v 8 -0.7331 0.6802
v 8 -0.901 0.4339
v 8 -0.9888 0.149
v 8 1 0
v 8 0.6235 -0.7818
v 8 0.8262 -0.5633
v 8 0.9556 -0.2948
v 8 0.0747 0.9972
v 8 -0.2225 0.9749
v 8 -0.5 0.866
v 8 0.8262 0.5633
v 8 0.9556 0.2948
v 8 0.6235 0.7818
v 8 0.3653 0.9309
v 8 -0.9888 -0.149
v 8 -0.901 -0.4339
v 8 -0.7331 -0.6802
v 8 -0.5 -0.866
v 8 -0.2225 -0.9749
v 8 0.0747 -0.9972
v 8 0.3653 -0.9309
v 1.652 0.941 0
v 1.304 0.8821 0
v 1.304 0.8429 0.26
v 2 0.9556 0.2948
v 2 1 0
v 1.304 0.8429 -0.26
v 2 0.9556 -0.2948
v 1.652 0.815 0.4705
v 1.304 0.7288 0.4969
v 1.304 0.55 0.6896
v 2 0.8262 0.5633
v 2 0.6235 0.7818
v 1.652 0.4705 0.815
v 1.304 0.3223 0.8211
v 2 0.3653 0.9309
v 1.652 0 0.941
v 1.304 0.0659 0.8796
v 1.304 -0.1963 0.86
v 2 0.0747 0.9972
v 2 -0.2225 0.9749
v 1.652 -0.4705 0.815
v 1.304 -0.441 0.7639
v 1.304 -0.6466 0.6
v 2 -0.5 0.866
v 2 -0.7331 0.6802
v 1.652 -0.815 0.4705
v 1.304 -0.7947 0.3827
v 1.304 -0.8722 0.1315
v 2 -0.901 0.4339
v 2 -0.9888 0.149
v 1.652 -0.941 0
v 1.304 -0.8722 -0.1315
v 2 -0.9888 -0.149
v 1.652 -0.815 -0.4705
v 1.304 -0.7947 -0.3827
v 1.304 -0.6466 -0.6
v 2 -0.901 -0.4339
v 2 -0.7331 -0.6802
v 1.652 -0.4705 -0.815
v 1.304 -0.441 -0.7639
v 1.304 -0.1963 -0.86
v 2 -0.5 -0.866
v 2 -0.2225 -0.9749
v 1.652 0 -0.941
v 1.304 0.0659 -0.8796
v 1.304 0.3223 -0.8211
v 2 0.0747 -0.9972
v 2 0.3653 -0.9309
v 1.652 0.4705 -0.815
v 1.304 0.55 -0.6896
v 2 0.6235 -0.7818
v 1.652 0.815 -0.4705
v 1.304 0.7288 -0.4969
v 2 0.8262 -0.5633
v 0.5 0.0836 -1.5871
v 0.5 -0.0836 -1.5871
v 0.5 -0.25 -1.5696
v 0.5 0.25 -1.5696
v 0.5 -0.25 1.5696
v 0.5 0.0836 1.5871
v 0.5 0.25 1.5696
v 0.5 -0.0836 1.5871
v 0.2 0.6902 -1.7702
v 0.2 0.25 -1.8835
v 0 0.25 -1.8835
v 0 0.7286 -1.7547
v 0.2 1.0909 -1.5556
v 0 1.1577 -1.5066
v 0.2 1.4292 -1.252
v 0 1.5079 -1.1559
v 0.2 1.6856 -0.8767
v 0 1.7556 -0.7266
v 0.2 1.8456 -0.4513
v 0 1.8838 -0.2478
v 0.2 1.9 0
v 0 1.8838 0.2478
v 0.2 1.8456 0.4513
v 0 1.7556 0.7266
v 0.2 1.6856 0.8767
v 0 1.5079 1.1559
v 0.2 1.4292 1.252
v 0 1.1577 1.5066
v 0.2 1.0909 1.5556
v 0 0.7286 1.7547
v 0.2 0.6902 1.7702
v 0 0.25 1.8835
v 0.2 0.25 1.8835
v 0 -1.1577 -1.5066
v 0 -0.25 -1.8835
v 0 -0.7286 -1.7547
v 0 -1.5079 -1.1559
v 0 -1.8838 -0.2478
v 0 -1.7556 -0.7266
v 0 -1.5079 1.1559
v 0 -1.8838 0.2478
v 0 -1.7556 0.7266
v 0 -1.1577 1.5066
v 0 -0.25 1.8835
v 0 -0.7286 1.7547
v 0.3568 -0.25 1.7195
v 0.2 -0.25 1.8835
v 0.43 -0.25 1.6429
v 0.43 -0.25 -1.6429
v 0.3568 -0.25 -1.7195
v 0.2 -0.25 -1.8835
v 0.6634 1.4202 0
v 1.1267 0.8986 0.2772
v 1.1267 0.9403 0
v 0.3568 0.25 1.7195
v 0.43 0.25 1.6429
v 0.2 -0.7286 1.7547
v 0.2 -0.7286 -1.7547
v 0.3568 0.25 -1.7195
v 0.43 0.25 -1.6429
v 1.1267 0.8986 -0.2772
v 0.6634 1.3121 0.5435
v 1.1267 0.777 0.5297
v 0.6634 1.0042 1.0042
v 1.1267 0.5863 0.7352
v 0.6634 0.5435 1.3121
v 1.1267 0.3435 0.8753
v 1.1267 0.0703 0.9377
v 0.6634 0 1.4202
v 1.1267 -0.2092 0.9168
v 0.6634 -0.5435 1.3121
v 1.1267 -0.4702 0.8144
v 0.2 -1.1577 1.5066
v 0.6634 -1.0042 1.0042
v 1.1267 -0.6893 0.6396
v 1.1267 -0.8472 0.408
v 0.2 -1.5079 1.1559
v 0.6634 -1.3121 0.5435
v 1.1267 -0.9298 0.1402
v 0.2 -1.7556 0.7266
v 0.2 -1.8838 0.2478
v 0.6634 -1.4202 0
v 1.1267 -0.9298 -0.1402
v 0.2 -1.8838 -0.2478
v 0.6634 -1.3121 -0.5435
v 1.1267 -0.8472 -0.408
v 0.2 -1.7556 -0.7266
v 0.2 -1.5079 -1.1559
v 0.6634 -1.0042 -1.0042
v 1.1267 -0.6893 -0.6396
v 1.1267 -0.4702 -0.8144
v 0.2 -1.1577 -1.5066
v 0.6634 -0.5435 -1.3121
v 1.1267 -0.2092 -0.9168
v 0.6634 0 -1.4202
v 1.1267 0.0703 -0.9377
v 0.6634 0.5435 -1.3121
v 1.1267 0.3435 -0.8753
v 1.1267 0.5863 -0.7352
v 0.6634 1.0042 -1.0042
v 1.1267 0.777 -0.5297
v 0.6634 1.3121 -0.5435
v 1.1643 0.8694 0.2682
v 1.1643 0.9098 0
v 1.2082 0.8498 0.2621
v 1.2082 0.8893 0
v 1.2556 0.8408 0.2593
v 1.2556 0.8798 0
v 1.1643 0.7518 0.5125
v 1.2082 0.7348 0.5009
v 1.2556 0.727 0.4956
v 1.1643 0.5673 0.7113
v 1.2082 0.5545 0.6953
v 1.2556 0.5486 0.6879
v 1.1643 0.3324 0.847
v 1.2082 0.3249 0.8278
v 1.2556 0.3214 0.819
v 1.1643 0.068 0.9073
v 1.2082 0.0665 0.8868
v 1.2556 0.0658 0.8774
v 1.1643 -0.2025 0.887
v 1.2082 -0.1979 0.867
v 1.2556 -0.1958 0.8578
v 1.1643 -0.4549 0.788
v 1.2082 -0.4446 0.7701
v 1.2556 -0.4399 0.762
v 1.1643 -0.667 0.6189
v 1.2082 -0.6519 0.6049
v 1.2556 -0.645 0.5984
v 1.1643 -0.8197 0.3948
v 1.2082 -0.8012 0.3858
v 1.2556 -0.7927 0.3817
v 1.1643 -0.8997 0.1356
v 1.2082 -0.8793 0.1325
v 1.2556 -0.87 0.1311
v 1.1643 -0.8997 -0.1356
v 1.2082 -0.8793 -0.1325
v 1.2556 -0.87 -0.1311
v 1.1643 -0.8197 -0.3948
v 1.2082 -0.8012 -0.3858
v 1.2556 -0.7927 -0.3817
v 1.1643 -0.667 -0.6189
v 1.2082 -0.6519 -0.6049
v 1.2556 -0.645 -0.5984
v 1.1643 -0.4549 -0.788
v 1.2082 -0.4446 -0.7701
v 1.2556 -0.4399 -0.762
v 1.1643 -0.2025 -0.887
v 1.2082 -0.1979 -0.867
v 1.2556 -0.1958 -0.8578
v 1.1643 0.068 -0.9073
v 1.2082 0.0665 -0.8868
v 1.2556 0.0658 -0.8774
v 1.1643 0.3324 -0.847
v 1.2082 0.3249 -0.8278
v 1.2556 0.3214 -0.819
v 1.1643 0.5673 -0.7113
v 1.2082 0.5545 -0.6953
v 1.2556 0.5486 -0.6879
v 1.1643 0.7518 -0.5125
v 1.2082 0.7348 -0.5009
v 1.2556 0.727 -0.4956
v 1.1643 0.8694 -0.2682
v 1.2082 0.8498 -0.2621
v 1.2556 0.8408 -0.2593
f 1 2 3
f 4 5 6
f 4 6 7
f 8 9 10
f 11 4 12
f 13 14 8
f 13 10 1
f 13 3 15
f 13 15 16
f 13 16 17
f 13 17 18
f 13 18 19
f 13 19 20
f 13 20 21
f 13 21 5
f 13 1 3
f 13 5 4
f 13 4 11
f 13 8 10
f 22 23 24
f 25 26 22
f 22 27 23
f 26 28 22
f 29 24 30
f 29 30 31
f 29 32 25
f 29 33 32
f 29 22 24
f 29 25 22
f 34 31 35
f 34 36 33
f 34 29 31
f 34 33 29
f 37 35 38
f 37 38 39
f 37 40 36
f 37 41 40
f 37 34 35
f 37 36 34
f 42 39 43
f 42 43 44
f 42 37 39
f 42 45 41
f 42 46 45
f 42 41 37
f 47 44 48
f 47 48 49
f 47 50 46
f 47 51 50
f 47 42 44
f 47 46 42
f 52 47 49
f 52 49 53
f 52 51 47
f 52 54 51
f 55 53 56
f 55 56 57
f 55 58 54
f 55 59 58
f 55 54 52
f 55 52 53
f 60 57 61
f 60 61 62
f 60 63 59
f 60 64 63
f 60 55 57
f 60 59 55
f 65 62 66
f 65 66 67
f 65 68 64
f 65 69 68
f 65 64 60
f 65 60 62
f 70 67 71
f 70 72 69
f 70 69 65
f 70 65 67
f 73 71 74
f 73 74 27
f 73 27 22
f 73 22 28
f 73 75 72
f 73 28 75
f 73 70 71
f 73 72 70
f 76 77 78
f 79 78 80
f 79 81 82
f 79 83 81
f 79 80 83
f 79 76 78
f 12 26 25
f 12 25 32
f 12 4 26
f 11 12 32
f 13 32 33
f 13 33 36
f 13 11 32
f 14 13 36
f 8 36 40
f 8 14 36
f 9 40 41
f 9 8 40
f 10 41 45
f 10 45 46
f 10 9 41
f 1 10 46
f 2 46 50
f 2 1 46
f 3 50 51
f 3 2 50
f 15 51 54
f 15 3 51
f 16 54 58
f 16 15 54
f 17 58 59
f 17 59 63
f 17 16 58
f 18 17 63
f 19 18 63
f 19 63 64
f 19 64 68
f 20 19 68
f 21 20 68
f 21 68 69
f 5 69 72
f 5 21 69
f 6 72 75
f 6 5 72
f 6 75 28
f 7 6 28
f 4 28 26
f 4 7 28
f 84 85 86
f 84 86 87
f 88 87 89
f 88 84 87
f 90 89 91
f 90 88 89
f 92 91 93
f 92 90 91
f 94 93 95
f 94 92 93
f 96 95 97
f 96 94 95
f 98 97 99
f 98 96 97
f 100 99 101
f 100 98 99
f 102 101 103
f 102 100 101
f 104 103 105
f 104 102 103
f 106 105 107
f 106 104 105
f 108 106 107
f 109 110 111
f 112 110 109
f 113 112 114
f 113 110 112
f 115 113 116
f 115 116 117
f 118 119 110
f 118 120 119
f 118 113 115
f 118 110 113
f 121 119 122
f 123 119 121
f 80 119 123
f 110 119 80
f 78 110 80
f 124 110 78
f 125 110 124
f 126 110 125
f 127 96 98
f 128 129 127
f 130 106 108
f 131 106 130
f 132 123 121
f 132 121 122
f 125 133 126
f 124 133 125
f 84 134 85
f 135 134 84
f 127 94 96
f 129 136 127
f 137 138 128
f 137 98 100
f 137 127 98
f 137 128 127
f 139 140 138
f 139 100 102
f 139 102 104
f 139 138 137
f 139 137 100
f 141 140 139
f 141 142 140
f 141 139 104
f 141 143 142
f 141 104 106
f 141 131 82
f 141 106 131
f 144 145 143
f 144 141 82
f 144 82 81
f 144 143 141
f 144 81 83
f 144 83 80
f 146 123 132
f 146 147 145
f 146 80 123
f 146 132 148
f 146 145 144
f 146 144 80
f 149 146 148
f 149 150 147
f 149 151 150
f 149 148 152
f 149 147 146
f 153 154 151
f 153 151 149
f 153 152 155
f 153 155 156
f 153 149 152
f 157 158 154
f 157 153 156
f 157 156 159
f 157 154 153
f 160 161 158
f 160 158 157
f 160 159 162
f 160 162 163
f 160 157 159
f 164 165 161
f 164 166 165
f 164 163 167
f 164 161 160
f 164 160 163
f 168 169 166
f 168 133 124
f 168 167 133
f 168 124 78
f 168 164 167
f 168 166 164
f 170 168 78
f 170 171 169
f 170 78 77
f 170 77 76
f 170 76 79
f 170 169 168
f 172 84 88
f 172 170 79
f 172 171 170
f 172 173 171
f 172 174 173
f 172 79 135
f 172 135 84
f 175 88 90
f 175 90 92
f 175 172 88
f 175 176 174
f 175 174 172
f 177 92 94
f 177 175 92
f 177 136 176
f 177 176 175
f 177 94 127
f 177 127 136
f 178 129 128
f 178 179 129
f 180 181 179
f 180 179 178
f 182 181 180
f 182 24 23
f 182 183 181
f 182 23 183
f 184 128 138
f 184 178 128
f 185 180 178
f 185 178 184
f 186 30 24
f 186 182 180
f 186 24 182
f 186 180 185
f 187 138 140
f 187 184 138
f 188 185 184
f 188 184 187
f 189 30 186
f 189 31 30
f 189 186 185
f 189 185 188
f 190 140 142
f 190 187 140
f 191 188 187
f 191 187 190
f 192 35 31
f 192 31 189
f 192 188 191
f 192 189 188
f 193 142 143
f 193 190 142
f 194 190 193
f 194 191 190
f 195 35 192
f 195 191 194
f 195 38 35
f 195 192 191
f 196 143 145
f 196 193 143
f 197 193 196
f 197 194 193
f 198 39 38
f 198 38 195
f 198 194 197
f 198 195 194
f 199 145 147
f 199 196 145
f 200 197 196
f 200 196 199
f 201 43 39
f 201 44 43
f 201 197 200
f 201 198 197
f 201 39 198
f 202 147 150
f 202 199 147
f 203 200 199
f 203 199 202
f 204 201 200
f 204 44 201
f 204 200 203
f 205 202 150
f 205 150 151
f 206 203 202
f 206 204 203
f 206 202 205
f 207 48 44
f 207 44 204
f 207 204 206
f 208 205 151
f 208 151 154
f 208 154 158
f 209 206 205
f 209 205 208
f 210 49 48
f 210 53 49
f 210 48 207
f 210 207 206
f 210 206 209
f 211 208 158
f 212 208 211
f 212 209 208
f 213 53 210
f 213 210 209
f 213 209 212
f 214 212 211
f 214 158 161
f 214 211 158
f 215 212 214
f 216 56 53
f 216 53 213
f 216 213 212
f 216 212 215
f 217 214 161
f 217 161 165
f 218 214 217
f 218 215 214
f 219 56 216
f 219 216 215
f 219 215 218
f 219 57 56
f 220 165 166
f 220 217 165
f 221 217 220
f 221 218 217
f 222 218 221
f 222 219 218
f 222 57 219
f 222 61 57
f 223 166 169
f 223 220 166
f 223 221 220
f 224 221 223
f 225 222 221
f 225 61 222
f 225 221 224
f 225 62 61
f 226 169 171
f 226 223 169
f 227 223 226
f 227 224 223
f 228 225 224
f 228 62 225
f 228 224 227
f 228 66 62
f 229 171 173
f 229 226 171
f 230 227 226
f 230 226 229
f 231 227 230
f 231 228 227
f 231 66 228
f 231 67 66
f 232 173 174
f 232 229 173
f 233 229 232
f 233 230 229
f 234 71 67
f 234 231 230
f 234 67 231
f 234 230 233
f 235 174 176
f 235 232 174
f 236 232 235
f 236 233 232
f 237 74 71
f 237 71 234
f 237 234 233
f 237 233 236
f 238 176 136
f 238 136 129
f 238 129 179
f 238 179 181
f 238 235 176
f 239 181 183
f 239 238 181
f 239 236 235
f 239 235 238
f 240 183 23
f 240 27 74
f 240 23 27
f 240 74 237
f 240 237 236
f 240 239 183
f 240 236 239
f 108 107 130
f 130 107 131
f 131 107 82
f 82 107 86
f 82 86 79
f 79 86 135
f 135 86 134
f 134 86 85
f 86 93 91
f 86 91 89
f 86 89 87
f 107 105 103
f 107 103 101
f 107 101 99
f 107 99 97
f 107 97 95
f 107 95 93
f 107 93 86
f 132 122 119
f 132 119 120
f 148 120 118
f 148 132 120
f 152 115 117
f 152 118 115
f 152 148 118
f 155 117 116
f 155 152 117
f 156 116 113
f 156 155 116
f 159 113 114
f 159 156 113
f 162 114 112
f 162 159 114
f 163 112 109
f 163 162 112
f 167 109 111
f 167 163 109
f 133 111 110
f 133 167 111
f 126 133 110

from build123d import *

# Parameters (mm, degrees)
SKETCH_3_W               = 0.5
SKETCH_3_H               = 0.5
CUT_EXTRUDE_1_DEPTH      = 2.9
CUT_EXTRUDE_1_DEPTH_BACK = 2.9


with BuildPart() as part:
    # Эскиз2 → Повернуть1 (revolve)
    with BuildSketch(Plane.XY):
        with BuildLine():
            Line((0, 0), (0, 1.9))
            Line((0, 1.9), (0.2, 1.9))
            Line((0.2, 1.9), (1.126725855, 0.940347284))
            ThreePointArc((1.126725855, 0.940347284), (1.20815228, 0.889276183), (1.304000388, 0.882088693))
            Line((1.304000388, 0.882088693), (2, 1))
            Line((2, 1), (8, 1))
            Line((8, 1), (8, 0))
            Line((8, 0), (0, 0))
        make_face()
    revolve(axis=Axis((0, 0, 0), (1, 0, 0)))

    # Эскиз3 → Вырез-Вытянуть1 (cut, two sides)
    with BuildSketch(Plane.XY) as cut_extrude_1_sk:
        with Locations((0.25, 0)):
            Rectangle(SKETCH_3_W, SKETCH_3_H)
    extrude(amount=CUT_EXTRUDE_1_DEPTH, mode=Mode.SUBTRACT)
    extrude(cut_extrude_1_sk.sketch, amount=-CUT_EXTRUDE_1_DEPTH_BACK, mode=Mode.SUBTRACT)


solid = part.part
